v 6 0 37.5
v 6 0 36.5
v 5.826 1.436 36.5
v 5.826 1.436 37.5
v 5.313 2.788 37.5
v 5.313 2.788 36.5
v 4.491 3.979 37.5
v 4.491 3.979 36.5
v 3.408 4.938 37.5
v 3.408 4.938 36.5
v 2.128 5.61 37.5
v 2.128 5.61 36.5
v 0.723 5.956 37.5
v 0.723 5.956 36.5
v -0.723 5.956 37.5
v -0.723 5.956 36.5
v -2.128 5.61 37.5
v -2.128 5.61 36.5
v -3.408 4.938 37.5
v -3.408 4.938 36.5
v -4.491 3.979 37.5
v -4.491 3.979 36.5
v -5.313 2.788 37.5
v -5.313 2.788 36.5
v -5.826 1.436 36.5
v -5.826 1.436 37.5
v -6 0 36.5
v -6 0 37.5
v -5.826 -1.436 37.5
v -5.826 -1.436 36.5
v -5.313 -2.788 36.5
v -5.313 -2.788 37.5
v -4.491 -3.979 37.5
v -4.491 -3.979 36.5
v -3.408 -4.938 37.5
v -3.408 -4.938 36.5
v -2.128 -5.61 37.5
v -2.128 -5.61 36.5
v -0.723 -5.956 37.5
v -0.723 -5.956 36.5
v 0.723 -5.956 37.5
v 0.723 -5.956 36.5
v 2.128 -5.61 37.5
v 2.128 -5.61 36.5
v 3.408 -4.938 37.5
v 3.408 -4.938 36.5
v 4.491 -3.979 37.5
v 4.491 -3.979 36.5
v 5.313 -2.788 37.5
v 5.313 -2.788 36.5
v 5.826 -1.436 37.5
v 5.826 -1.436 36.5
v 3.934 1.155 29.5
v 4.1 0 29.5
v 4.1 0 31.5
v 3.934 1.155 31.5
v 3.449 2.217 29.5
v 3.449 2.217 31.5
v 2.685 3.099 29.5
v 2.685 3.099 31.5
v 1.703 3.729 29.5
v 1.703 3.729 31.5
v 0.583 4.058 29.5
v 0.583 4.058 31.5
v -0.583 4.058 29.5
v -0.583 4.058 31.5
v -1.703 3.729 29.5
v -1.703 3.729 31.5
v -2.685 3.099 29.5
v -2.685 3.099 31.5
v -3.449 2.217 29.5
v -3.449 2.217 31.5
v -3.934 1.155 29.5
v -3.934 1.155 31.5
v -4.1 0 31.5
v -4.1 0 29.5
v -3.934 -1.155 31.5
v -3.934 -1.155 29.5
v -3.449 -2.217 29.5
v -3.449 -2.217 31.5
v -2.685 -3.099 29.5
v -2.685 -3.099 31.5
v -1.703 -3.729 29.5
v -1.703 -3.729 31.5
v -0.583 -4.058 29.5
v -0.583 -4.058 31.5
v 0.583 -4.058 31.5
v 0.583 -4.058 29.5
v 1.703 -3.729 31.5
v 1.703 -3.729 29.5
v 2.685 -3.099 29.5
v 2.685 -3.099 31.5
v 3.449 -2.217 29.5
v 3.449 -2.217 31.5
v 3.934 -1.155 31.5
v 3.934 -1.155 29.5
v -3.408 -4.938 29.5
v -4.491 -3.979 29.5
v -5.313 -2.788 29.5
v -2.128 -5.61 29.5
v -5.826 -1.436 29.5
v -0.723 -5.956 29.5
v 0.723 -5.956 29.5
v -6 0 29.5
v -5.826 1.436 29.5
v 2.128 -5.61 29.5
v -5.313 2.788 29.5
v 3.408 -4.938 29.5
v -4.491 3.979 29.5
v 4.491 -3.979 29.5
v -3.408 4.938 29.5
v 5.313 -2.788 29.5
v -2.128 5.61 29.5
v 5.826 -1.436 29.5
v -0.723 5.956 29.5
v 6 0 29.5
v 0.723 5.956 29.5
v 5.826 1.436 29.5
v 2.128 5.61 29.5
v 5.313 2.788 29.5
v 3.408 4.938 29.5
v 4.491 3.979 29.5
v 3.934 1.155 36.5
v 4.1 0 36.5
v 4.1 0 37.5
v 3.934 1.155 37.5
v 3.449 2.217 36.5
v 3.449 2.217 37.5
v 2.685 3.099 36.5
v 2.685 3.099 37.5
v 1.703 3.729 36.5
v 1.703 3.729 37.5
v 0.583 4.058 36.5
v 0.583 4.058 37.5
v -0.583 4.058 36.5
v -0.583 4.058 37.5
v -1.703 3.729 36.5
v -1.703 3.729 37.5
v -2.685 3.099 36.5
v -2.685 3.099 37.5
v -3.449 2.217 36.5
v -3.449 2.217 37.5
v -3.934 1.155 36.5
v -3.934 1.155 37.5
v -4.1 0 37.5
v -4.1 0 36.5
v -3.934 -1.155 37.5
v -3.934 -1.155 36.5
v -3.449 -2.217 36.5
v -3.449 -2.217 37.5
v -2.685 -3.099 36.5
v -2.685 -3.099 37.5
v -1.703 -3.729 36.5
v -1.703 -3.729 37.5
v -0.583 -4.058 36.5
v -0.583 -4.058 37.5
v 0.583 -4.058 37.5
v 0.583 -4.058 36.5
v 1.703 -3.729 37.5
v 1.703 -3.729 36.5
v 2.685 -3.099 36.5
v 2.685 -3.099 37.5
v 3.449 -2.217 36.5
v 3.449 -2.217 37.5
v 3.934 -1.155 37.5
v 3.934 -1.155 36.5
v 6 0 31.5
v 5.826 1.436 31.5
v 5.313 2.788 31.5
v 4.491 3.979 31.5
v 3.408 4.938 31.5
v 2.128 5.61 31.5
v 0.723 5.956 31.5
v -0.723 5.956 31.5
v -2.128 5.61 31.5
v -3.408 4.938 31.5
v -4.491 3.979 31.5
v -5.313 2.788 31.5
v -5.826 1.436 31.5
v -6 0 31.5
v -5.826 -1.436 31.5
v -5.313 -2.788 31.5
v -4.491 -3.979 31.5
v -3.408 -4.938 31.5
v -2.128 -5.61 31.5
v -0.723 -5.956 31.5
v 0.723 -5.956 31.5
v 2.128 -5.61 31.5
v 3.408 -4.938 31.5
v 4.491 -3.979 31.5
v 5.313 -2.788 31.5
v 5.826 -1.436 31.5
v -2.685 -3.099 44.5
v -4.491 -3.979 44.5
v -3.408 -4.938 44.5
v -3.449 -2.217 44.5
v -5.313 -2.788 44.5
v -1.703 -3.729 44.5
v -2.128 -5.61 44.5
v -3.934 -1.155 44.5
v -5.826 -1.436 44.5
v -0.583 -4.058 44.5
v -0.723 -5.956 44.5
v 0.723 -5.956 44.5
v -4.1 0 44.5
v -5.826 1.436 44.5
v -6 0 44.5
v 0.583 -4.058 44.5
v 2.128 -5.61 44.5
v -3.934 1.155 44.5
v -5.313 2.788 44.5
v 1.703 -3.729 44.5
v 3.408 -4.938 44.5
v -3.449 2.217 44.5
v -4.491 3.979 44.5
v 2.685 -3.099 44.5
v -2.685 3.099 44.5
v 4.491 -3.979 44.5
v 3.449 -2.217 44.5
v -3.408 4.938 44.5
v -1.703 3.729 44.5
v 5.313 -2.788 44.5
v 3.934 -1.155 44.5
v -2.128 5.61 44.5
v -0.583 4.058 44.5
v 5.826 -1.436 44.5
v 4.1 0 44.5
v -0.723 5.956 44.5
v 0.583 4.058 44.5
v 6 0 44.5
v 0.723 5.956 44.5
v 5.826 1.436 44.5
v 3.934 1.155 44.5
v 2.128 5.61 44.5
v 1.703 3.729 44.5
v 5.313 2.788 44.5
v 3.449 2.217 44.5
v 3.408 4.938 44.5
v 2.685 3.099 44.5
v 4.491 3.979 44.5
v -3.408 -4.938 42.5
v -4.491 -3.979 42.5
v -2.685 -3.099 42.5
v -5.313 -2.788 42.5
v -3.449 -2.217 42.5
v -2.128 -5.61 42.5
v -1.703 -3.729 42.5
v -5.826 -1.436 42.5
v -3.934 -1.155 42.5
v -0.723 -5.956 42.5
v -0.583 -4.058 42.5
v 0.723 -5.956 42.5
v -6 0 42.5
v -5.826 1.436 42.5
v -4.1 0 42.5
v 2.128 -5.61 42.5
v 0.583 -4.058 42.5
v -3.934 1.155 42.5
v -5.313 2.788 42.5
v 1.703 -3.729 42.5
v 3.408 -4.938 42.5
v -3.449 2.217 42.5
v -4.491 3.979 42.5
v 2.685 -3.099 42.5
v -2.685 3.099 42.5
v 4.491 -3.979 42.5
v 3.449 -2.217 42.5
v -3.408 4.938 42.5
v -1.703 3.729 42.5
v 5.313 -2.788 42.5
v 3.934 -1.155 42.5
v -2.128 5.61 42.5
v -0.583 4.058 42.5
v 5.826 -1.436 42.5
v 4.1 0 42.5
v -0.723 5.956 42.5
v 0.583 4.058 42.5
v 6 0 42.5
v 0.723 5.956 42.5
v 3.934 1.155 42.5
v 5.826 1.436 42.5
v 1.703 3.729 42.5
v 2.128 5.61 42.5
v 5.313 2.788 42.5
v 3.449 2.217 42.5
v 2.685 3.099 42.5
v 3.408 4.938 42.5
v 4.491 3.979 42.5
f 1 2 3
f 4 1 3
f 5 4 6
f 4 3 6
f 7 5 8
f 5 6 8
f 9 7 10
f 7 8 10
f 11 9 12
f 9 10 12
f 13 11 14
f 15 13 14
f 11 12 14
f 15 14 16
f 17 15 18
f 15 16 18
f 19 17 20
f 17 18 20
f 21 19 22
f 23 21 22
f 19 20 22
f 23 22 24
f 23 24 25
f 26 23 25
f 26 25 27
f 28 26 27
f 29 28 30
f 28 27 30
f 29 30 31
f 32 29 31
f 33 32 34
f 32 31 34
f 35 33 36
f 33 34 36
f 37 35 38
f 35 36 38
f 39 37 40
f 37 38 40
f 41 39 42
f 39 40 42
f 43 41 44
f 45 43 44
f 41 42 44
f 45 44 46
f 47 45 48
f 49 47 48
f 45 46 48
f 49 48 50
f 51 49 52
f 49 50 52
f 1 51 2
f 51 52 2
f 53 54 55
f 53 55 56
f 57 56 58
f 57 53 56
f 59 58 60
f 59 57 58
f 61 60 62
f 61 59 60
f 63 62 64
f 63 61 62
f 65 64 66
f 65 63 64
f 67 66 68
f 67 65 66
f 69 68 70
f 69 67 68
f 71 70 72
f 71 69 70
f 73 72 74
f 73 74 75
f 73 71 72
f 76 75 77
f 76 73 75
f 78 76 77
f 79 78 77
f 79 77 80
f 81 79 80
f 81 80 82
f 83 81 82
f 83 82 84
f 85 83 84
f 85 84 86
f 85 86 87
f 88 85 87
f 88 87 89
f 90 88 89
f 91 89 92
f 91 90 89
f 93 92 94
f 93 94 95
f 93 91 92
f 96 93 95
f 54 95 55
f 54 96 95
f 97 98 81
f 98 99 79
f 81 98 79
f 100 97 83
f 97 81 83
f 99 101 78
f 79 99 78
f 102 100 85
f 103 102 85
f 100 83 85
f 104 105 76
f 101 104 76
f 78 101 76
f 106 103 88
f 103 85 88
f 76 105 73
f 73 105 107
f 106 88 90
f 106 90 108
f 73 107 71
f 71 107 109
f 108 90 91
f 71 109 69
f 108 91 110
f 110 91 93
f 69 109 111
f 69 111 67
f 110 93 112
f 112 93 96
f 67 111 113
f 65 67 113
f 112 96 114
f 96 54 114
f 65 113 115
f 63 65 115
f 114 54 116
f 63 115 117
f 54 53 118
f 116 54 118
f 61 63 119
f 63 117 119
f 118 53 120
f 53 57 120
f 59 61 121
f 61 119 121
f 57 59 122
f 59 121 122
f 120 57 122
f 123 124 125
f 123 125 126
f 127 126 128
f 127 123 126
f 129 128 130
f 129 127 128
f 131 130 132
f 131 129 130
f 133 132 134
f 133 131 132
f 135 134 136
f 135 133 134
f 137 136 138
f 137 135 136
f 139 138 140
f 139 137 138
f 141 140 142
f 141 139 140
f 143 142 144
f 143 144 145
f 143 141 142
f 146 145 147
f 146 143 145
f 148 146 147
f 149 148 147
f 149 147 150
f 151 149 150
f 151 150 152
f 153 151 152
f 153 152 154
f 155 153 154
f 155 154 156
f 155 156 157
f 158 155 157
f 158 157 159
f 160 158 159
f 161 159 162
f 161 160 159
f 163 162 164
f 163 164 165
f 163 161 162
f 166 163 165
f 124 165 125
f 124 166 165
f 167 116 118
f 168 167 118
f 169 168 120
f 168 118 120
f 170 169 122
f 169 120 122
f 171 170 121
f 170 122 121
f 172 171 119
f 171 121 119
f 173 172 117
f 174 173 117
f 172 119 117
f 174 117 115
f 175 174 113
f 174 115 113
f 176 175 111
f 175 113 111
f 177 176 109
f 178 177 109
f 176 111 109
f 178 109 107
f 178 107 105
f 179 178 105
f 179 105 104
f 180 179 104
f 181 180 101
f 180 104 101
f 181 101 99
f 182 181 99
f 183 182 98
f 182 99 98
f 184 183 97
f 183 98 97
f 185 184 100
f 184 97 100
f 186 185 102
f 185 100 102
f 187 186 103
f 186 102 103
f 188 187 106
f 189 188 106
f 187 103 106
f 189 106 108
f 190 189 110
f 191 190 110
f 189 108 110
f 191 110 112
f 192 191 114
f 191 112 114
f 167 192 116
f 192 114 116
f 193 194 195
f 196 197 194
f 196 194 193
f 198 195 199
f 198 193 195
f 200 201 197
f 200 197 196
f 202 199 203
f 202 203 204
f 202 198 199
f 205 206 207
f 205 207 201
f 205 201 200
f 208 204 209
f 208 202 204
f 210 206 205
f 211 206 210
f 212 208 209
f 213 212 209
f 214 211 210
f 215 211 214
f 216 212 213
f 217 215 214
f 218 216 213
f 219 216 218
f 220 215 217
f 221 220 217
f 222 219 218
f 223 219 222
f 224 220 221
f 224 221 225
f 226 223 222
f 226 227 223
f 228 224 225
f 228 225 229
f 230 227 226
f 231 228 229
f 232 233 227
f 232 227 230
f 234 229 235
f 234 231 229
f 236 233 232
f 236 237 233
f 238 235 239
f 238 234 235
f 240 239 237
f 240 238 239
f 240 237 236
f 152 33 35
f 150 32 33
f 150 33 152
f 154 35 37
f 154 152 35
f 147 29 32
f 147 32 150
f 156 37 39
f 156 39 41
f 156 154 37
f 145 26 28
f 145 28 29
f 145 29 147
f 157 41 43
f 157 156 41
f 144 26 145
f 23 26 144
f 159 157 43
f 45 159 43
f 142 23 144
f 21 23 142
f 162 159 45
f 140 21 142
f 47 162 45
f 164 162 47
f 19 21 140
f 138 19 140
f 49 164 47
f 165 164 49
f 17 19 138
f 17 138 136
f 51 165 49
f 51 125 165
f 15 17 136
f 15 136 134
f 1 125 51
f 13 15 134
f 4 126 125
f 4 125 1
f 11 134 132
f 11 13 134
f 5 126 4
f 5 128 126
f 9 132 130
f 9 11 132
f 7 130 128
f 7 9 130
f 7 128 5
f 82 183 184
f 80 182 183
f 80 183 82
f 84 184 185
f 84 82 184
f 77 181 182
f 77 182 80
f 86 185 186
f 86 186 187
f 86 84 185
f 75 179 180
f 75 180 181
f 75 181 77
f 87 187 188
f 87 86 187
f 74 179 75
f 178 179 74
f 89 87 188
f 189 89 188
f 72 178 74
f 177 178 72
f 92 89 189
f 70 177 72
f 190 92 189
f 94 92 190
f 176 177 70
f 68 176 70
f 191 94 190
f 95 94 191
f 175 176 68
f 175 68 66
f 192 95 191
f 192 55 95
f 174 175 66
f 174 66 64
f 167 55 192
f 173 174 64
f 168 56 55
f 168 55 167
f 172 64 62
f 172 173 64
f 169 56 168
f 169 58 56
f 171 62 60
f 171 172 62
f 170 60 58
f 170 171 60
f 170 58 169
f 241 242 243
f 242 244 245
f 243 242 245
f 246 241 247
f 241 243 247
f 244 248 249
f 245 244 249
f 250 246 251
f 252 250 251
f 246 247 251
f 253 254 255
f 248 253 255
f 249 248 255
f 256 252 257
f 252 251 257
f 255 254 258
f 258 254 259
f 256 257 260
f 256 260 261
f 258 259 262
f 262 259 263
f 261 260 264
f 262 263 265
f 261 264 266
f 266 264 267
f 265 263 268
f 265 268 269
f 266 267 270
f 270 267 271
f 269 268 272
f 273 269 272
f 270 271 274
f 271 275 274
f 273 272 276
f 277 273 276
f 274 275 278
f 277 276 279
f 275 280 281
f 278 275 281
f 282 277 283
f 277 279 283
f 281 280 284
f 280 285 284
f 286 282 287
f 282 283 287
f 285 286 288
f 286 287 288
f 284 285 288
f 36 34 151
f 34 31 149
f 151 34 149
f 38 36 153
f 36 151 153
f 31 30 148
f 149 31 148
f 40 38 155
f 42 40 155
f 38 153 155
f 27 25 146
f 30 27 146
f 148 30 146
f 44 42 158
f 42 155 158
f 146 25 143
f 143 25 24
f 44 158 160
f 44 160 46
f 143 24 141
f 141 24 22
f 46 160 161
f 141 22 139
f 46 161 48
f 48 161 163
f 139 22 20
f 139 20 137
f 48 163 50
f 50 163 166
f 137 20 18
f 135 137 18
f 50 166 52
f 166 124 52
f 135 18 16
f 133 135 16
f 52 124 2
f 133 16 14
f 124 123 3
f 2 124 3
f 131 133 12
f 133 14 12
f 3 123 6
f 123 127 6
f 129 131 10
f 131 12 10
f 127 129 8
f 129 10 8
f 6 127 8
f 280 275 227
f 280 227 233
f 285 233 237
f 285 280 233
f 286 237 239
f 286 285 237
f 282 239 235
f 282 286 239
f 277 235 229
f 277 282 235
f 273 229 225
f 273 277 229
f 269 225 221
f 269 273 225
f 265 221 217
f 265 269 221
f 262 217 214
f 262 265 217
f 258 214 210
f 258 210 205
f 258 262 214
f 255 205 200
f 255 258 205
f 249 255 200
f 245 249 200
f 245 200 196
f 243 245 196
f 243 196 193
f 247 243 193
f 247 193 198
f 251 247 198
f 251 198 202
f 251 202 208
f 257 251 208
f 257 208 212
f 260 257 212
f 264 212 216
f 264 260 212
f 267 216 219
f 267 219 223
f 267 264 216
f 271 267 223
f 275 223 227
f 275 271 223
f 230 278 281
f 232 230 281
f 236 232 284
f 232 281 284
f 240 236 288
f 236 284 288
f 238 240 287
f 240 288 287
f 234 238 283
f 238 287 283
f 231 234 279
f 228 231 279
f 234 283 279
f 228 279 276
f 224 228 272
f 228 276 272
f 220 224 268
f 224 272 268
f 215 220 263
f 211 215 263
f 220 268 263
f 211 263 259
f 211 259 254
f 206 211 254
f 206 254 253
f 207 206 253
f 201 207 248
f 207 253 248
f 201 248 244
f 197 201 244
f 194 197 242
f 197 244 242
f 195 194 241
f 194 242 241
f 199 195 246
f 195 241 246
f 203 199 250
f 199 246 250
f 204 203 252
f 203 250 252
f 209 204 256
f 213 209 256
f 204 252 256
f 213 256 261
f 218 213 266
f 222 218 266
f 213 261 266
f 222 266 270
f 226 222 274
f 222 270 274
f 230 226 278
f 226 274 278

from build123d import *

# Parameters (mm, degrees)
REAR_START   = 29.5
SKETCH_1_R   = 6
SKETCH_1_R_2 = 4.1
REAR_DEPTH   = 2
MIDDLE_START = 36.5
SKETCH_2_R   = 6
SKETCH_2_R_2 = 4.1
MIDDLE_DEPTH = 1
FRONT_START  = 42.5
SKETCH_3_R   = 6
SKETCH_3_R_2 = 4.1
FRONT_DEPTH  = 2


with BuildPart() as part:
    # Эскиз1 → Rear (new body)
    with BuildSketch(Plane.XY.offset(REAR_START)):
        Circle(SKETCH_1_R)
        Circle(SKETCH_1_R_2, mode=Mode.SUBTRACT)
    extrude(amount=REAR_DEPTH)


with BuildPart() as body_2:
    # Эскиз2 → Middle (new body)
    with BuildSketch(Plane.XY.offset(MIDDLE_START)):
        Circle(SKETCH_2_R)
        Circle(SKETCH_2_R_2, mode=Mode.SUBTRACT)
    extrude(amount=MIDDLE_DEPTH)


with BuildPart() as body_3:
    # Эскиз3 → Front (new body)
    with BuildSketch(Plane.XY.offset(FRONT_START)):
        Circle(SKETCH_3_R)
        Circle(SKETCH_3_R_2, mode=Mode.SUBTRACT)
    extrude(amount=FRONT_DEPTH)


solid = Compound([part.part, body_2.part, body_3.part])
